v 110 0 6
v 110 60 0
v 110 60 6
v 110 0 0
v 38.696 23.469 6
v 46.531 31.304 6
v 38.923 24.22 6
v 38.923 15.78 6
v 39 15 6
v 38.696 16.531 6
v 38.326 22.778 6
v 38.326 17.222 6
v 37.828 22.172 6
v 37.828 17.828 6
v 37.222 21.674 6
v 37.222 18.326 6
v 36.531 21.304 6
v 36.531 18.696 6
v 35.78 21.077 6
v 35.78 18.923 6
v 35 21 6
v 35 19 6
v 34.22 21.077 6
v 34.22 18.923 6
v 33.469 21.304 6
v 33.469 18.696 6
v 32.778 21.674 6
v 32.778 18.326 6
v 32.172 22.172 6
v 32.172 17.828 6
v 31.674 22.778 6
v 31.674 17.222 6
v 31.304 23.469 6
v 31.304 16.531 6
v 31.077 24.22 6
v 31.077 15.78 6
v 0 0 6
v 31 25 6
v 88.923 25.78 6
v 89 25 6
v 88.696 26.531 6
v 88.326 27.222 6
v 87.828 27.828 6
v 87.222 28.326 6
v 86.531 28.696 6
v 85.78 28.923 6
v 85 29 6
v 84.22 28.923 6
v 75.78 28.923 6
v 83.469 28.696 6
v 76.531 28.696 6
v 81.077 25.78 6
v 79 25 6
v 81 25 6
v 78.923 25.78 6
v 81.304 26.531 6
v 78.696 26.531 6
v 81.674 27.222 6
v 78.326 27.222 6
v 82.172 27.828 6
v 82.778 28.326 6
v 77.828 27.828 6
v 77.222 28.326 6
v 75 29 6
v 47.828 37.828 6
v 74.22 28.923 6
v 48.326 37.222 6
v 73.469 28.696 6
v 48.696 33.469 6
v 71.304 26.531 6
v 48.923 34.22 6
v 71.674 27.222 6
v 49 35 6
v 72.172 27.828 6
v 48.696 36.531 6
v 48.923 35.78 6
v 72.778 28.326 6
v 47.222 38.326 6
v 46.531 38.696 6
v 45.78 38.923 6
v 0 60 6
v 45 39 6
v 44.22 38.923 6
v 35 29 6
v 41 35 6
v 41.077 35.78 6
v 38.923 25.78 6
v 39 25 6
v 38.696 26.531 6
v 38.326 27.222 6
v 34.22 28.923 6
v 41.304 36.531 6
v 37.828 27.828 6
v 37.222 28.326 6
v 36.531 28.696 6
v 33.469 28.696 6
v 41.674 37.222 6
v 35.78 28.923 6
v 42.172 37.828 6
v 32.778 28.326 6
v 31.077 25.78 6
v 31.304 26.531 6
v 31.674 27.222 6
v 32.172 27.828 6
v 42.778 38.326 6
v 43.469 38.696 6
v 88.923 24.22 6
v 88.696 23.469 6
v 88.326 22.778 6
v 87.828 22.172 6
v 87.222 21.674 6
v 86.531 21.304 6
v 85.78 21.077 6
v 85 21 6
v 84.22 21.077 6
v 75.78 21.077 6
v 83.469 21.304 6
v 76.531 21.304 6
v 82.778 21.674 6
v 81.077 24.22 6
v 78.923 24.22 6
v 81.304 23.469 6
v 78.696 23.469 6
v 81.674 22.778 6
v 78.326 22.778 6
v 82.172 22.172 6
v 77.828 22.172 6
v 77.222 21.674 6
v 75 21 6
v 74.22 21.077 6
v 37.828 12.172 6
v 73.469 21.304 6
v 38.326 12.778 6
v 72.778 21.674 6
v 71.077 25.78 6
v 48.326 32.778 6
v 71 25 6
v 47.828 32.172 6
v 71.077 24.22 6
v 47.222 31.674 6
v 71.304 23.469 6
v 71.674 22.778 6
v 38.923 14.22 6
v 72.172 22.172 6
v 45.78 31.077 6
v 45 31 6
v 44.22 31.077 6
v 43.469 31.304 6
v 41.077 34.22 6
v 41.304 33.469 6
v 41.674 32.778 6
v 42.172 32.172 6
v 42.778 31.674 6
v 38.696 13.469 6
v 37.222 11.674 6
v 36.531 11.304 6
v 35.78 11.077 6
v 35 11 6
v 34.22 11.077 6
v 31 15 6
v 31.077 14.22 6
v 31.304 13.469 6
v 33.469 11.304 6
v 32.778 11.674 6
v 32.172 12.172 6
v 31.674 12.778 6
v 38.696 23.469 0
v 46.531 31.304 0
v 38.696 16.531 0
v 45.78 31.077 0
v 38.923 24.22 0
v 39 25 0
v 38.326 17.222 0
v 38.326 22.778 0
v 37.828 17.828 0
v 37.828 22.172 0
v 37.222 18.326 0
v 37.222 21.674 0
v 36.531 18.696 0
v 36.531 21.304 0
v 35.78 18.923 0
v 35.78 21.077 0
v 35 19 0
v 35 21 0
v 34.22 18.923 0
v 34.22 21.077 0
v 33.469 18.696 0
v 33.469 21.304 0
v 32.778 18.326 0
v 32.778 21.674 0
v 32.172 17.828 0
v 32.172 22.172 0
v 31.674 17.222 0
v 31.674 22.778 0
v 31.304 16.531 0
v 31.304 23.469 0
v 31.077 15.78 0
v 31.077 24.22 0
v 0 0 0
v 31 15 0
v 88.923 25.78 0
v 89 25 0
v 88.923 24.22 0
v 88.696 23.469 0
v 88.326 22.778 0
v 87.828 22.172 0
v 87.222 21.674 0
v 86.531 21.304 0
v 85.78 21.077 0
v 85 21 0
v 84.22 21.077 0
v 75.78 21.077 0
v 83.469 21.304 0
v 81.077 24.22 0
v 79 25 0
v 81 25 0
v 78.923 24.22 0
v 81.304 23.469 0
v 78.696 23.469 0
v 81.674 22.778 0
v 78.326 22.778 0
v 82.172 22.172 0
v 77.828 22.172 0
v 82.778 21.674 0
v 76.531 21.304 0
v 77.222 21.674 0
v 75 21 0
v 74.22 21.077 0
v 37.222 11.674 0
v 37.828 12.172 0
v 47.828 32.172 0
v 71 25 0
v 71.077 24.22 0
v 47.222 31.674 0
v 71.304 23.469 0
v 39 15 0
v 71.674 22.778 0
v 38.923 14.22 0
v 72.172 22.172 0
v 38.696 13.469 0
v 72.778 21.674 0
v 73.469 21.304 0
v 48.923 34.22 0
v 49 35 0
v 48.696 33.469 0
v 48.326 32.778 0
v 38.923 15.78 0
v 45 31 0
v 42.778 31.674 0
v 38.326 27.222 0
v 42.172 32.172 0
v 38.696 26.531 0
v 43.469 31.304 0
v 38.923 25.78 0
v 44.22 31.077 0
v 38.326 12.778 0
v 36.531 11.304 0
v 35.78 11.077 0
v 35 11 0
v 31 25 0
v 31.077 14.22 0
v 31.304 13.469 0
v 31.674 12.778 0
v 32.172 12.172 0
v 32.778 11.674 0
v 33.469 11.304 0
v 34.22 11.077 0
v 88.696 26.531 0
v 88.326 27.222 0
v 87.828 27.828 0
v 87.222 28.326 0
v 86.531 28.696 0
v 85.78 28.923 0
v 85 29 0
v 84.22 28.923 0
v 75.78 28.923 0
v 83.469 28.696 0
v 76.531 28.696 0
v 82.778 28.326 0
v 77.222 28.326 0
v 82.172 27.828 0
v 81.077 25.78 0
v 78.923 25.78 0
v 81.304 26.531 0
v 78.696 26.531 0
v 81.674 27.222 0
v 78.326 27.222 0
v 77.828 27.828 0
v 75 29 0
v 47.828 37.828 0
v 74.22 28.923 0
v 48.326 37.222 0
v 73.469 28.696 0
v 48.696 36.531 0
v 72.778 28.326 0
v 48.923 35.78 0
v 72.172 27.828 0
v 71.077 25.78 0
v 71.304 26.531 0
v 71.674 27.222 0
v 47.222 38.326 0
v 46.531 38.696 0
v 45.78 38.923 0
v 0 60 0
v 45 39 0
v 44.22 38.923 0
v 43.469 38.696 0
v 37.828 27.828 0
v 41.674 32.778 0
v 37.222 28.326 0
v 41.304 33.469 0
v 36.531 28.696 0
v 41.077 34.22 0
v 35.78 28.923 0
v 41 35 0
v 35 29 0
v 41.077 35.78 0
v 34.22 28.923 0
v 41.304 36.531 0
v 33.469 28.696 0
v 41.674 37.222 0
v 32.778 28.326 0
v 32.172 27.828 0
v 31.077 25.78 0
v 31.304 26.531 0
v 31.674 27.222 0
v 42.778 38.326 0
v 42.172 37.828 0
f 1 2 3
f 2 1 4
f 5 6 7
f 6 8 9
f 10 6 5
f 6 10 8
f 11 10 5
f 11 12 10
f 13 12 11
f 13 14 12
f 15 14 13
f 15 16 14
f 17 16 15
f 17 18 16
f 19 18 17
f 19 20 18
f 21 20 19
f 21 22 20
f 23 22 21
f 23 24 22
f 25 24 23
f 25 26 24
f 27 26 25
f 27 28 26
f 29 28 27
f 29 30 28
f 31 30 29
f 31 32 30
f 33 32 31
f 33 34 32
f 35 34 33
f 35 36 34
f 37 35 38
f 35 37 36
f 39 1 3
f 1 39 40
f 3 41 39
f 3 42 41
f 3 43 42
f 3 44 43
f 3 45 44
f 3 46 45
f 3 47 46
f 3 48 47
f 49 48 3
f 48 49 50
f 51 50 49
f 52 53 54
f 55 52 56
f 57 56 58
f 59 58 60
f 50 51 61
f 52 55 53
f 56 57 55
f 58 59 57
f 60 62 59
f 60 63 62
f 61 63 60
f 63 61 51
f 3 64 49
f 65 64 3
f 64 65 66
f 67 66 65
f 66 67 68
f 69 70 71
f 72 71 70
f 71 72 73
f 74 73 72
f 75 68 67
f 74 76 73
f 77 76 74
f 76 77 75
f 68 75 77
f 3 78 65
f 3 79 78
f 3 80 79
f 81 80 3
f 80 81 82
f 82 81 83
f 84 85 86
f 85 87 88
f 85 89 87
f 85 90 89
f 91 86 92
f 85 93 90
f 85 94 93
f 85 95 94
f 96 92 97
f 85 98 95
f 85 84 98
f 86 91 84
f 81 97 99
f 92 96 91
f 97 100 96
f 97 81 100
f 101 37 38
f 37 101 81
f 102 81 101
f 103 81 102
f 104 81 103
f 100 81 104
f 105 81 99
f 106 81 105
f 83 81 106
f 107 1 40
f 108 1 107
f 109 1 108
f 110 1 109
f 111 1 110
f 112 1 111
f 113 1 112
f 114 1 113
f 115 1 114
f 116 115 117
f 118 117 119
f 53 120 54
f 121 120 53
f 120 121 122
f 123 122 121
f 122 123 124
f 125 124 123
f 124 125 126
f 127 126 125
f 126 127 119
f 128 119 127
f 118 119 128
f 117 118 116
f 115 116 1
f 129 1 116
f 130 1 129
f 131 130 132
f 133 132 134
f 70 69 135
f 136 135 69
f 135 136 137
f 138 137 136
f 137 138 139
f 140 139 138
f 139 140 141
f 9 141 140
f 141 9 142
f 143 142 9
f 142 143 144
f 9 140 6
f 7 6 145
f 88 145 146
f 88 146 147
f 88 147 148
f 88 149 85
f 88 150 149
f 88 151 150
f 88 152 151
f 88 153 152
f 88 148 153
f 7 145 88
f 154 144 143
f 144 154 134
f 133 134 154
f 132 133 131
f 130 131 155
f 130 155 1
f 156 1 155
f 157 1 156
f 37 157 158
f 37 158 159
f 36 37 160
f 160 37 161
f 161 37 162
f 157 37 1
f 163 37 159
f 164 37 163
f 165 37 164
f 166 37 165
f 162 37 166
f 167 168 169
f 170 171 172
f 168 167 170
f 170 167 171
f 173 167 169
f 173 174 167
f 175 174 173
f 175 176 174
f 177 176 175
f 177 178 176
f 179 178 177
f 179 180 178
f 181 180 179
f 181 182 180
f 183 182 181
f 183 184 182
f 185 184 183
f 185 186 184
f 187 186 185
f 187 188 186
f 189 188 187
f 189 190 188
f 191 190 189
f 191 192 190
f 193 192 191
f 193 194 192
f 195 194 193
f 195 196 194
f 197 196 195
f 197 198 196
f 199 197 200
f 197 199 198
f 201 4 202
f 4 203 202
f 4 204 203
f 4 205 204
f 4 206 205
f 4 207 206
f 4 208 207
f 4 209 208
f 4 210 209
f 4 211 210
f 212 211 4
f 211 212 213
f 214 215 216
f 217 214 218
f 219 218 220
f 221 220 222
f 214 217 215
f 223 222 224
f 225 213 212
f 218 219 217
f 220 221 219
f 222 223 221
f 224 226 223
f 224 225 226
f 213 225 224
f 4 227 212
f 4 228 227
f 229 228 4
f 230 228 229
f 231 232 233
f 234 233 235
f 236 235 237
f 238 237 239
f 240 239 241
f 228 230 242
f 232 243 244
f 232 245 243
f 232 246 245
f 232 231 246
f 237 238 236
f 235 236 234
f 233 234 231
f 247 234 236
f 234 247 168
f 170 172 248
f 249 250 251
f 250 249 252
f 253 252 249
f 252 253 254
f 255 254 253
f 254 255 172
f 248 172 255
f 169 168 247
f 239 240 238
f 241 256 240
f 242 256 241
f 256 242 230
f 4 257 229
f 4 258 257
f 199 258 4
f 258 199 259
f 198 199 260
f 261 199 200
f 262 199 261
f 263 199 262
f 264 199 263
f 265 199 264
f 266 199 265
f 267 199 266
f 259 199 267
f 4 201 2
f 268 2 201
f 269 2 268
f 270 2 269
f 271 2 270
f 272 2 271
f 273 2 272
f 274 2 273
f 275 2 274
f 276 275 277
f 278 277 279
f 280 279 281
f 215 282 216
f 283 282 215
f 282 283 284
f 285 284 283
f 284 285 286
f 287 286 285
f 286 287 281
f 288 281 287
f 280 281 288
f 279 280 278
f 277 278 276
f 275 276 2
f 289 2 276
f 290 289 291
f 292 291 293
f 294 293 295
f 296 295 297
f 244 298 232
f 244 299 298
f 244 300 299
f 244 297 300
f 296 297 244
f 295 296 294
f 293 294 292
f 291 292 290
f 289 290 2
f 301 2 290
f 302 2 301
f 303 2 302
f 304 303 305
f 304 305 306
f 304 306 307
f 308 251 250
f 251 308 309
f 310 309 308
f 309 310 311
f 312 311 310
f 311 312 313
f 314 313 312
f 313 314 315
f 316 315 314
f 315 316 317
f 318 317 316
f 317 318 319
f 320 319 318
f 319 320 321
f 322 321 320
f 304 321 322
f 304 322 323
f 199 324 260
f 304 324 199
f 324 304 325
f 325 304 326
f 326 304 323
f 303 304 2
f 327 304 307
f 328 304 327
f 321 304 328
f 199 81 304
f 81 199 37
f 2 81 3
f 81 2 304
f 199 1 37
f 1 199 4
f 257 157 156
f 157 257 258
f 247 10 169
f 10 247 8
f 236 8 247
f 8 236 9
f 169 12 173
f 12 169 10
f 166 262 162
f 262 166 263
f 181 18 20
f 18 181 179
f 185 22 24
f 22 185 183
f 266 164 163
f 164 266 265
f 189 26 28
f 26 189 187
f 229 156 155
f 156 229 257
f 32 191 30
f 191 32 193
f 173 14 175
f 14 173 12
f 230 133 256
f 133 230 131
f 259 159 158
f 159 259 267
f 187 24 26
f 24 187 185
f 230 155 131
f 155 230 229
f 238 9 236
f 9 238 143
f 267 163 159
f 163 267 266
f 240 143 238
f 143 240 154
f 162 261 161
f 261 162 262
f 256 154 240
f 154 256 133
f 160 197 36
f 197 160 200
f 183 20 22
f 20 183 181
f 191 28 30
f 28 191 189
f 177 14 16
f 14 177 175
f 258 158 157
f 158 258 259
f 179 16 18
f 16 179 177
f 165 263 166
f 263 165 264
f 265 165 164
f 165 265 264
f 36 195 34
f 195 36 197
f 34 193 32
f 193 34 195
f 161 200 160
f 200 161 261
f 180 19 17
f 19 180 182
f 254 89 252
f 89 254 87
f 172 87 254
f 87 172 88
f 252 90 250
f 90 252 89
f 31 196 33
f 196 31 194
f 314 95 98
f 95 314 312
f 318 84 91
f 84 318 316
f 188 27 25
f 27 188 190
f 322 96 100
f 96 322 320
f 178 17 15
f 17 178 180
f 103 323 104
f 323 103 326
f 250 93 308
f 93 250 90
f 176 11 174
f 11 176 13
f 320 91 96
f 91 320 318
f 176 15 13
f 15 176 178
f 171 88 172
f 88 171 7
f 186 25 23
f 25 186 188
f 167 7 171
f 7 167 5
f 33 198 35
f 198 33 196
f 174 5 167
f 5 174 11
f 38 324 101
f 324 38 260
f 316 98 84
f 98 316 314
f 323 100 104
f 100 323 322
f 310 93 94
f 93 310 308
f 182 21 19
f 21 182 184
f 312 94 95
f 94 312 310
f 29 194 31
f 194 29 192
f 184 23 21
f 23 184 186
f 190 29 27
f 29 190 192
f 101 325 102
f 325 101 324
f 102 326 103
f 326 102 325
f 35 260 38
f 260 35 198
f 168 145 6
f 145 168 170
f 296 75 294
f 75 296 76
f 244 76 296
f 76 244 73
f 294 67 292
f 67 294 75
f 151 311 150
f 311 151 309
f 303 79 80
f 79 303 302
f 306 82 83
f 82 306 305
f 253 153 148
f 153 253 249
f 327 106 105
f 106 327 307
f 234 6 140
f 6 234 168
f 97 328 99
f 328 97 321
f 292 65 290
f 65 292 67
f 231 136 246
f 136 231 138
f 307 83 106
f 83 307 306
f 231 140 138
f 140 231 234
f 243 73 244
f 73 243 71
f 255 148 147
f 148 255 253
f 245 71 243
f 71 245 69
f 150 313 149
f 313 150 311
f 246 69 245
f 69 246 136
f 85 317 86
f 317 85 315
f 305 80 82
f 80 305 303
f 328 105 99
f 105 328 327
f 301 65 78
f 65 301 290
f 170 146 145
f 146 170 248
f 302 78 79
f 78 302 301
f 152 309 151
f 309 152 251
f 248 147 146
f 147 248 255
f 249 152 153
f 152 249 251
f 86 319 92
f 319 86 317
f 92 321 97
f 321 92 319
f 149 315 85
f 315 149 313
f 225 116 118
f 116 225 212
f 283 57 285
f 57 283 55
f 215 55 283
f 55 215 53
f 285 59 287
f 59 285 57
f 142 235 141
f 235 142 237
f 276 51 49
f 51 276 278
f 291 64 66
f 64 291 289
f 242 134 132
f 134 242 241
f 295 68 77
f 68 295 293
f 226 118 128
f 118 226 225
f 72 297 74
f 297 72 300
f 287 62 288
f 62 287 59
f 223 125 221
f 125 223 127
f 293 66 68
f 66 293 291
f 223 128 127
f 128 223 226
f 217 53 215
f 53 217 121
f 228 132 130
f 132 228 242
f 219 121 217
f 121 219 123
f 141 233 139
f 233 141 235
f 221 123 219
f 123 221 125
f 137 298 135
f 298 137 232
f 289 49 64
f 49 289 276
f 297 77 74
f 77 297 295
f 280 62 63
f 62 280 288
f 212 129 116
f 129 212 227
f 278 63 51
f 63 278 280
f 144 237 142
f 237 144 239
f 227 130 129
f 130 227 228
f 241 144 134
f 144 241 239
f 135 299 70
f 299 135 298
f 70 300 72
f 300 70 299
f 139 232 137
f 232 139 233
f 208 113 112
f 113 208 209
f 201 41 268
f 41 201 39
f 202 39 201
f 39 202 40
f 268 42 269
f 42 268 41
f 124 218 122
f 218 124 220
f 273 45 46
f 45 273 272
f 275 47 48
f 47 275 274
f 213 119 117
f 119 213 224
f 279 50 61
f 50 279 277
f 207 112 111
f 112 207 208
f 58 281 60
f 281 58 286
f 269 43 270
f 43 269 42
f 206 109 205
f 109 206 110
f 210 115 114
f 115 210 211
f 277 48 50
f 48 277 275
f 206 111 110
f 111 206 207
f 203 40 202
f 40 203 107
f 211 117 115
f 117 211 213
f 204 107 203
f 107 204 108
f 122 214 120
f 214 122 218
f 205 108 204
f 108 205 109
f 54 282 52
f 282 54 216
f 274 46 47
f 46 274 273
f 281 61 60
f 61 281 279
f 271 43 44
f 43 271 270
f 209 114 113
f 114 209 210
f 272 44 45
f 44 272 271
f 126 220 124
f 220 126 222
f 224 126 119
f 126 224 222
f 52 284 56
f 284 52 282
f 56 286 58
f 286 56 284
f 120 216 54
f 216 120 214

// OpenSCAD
$fn = 32;

// ----------------------------------------------------------------------
// Hole field: plate with holes at given coordinates
// ----------------------------------------------------------------------

// --- parameters (mm) ---
plate_l = 110;            // plate length, X
plate_w = 60;             // plate width, Y
plate_t = 6;              // plate thickness, Z
hole_d = 8;               // hole diameter

difference() {
  cube([plate_l, plate_w, plate_t]);
  translate([35, 15, -1]) cylinder(h = plate_t + 2, d = hole_d);
  translate([35, 25, -1]) cylinder(h = plate_t + 2, d = hole_d);
  translate([45, 35, -1]) cylinder(h = plate_t + 2, d = hole_d);
  translate([75, 25, -1]) cylinder(h = plate_t + 2, d = hole_d);
  translate([85, 25, -1]) cylinder(h = plate_t + 2, d = hole_d);
}
